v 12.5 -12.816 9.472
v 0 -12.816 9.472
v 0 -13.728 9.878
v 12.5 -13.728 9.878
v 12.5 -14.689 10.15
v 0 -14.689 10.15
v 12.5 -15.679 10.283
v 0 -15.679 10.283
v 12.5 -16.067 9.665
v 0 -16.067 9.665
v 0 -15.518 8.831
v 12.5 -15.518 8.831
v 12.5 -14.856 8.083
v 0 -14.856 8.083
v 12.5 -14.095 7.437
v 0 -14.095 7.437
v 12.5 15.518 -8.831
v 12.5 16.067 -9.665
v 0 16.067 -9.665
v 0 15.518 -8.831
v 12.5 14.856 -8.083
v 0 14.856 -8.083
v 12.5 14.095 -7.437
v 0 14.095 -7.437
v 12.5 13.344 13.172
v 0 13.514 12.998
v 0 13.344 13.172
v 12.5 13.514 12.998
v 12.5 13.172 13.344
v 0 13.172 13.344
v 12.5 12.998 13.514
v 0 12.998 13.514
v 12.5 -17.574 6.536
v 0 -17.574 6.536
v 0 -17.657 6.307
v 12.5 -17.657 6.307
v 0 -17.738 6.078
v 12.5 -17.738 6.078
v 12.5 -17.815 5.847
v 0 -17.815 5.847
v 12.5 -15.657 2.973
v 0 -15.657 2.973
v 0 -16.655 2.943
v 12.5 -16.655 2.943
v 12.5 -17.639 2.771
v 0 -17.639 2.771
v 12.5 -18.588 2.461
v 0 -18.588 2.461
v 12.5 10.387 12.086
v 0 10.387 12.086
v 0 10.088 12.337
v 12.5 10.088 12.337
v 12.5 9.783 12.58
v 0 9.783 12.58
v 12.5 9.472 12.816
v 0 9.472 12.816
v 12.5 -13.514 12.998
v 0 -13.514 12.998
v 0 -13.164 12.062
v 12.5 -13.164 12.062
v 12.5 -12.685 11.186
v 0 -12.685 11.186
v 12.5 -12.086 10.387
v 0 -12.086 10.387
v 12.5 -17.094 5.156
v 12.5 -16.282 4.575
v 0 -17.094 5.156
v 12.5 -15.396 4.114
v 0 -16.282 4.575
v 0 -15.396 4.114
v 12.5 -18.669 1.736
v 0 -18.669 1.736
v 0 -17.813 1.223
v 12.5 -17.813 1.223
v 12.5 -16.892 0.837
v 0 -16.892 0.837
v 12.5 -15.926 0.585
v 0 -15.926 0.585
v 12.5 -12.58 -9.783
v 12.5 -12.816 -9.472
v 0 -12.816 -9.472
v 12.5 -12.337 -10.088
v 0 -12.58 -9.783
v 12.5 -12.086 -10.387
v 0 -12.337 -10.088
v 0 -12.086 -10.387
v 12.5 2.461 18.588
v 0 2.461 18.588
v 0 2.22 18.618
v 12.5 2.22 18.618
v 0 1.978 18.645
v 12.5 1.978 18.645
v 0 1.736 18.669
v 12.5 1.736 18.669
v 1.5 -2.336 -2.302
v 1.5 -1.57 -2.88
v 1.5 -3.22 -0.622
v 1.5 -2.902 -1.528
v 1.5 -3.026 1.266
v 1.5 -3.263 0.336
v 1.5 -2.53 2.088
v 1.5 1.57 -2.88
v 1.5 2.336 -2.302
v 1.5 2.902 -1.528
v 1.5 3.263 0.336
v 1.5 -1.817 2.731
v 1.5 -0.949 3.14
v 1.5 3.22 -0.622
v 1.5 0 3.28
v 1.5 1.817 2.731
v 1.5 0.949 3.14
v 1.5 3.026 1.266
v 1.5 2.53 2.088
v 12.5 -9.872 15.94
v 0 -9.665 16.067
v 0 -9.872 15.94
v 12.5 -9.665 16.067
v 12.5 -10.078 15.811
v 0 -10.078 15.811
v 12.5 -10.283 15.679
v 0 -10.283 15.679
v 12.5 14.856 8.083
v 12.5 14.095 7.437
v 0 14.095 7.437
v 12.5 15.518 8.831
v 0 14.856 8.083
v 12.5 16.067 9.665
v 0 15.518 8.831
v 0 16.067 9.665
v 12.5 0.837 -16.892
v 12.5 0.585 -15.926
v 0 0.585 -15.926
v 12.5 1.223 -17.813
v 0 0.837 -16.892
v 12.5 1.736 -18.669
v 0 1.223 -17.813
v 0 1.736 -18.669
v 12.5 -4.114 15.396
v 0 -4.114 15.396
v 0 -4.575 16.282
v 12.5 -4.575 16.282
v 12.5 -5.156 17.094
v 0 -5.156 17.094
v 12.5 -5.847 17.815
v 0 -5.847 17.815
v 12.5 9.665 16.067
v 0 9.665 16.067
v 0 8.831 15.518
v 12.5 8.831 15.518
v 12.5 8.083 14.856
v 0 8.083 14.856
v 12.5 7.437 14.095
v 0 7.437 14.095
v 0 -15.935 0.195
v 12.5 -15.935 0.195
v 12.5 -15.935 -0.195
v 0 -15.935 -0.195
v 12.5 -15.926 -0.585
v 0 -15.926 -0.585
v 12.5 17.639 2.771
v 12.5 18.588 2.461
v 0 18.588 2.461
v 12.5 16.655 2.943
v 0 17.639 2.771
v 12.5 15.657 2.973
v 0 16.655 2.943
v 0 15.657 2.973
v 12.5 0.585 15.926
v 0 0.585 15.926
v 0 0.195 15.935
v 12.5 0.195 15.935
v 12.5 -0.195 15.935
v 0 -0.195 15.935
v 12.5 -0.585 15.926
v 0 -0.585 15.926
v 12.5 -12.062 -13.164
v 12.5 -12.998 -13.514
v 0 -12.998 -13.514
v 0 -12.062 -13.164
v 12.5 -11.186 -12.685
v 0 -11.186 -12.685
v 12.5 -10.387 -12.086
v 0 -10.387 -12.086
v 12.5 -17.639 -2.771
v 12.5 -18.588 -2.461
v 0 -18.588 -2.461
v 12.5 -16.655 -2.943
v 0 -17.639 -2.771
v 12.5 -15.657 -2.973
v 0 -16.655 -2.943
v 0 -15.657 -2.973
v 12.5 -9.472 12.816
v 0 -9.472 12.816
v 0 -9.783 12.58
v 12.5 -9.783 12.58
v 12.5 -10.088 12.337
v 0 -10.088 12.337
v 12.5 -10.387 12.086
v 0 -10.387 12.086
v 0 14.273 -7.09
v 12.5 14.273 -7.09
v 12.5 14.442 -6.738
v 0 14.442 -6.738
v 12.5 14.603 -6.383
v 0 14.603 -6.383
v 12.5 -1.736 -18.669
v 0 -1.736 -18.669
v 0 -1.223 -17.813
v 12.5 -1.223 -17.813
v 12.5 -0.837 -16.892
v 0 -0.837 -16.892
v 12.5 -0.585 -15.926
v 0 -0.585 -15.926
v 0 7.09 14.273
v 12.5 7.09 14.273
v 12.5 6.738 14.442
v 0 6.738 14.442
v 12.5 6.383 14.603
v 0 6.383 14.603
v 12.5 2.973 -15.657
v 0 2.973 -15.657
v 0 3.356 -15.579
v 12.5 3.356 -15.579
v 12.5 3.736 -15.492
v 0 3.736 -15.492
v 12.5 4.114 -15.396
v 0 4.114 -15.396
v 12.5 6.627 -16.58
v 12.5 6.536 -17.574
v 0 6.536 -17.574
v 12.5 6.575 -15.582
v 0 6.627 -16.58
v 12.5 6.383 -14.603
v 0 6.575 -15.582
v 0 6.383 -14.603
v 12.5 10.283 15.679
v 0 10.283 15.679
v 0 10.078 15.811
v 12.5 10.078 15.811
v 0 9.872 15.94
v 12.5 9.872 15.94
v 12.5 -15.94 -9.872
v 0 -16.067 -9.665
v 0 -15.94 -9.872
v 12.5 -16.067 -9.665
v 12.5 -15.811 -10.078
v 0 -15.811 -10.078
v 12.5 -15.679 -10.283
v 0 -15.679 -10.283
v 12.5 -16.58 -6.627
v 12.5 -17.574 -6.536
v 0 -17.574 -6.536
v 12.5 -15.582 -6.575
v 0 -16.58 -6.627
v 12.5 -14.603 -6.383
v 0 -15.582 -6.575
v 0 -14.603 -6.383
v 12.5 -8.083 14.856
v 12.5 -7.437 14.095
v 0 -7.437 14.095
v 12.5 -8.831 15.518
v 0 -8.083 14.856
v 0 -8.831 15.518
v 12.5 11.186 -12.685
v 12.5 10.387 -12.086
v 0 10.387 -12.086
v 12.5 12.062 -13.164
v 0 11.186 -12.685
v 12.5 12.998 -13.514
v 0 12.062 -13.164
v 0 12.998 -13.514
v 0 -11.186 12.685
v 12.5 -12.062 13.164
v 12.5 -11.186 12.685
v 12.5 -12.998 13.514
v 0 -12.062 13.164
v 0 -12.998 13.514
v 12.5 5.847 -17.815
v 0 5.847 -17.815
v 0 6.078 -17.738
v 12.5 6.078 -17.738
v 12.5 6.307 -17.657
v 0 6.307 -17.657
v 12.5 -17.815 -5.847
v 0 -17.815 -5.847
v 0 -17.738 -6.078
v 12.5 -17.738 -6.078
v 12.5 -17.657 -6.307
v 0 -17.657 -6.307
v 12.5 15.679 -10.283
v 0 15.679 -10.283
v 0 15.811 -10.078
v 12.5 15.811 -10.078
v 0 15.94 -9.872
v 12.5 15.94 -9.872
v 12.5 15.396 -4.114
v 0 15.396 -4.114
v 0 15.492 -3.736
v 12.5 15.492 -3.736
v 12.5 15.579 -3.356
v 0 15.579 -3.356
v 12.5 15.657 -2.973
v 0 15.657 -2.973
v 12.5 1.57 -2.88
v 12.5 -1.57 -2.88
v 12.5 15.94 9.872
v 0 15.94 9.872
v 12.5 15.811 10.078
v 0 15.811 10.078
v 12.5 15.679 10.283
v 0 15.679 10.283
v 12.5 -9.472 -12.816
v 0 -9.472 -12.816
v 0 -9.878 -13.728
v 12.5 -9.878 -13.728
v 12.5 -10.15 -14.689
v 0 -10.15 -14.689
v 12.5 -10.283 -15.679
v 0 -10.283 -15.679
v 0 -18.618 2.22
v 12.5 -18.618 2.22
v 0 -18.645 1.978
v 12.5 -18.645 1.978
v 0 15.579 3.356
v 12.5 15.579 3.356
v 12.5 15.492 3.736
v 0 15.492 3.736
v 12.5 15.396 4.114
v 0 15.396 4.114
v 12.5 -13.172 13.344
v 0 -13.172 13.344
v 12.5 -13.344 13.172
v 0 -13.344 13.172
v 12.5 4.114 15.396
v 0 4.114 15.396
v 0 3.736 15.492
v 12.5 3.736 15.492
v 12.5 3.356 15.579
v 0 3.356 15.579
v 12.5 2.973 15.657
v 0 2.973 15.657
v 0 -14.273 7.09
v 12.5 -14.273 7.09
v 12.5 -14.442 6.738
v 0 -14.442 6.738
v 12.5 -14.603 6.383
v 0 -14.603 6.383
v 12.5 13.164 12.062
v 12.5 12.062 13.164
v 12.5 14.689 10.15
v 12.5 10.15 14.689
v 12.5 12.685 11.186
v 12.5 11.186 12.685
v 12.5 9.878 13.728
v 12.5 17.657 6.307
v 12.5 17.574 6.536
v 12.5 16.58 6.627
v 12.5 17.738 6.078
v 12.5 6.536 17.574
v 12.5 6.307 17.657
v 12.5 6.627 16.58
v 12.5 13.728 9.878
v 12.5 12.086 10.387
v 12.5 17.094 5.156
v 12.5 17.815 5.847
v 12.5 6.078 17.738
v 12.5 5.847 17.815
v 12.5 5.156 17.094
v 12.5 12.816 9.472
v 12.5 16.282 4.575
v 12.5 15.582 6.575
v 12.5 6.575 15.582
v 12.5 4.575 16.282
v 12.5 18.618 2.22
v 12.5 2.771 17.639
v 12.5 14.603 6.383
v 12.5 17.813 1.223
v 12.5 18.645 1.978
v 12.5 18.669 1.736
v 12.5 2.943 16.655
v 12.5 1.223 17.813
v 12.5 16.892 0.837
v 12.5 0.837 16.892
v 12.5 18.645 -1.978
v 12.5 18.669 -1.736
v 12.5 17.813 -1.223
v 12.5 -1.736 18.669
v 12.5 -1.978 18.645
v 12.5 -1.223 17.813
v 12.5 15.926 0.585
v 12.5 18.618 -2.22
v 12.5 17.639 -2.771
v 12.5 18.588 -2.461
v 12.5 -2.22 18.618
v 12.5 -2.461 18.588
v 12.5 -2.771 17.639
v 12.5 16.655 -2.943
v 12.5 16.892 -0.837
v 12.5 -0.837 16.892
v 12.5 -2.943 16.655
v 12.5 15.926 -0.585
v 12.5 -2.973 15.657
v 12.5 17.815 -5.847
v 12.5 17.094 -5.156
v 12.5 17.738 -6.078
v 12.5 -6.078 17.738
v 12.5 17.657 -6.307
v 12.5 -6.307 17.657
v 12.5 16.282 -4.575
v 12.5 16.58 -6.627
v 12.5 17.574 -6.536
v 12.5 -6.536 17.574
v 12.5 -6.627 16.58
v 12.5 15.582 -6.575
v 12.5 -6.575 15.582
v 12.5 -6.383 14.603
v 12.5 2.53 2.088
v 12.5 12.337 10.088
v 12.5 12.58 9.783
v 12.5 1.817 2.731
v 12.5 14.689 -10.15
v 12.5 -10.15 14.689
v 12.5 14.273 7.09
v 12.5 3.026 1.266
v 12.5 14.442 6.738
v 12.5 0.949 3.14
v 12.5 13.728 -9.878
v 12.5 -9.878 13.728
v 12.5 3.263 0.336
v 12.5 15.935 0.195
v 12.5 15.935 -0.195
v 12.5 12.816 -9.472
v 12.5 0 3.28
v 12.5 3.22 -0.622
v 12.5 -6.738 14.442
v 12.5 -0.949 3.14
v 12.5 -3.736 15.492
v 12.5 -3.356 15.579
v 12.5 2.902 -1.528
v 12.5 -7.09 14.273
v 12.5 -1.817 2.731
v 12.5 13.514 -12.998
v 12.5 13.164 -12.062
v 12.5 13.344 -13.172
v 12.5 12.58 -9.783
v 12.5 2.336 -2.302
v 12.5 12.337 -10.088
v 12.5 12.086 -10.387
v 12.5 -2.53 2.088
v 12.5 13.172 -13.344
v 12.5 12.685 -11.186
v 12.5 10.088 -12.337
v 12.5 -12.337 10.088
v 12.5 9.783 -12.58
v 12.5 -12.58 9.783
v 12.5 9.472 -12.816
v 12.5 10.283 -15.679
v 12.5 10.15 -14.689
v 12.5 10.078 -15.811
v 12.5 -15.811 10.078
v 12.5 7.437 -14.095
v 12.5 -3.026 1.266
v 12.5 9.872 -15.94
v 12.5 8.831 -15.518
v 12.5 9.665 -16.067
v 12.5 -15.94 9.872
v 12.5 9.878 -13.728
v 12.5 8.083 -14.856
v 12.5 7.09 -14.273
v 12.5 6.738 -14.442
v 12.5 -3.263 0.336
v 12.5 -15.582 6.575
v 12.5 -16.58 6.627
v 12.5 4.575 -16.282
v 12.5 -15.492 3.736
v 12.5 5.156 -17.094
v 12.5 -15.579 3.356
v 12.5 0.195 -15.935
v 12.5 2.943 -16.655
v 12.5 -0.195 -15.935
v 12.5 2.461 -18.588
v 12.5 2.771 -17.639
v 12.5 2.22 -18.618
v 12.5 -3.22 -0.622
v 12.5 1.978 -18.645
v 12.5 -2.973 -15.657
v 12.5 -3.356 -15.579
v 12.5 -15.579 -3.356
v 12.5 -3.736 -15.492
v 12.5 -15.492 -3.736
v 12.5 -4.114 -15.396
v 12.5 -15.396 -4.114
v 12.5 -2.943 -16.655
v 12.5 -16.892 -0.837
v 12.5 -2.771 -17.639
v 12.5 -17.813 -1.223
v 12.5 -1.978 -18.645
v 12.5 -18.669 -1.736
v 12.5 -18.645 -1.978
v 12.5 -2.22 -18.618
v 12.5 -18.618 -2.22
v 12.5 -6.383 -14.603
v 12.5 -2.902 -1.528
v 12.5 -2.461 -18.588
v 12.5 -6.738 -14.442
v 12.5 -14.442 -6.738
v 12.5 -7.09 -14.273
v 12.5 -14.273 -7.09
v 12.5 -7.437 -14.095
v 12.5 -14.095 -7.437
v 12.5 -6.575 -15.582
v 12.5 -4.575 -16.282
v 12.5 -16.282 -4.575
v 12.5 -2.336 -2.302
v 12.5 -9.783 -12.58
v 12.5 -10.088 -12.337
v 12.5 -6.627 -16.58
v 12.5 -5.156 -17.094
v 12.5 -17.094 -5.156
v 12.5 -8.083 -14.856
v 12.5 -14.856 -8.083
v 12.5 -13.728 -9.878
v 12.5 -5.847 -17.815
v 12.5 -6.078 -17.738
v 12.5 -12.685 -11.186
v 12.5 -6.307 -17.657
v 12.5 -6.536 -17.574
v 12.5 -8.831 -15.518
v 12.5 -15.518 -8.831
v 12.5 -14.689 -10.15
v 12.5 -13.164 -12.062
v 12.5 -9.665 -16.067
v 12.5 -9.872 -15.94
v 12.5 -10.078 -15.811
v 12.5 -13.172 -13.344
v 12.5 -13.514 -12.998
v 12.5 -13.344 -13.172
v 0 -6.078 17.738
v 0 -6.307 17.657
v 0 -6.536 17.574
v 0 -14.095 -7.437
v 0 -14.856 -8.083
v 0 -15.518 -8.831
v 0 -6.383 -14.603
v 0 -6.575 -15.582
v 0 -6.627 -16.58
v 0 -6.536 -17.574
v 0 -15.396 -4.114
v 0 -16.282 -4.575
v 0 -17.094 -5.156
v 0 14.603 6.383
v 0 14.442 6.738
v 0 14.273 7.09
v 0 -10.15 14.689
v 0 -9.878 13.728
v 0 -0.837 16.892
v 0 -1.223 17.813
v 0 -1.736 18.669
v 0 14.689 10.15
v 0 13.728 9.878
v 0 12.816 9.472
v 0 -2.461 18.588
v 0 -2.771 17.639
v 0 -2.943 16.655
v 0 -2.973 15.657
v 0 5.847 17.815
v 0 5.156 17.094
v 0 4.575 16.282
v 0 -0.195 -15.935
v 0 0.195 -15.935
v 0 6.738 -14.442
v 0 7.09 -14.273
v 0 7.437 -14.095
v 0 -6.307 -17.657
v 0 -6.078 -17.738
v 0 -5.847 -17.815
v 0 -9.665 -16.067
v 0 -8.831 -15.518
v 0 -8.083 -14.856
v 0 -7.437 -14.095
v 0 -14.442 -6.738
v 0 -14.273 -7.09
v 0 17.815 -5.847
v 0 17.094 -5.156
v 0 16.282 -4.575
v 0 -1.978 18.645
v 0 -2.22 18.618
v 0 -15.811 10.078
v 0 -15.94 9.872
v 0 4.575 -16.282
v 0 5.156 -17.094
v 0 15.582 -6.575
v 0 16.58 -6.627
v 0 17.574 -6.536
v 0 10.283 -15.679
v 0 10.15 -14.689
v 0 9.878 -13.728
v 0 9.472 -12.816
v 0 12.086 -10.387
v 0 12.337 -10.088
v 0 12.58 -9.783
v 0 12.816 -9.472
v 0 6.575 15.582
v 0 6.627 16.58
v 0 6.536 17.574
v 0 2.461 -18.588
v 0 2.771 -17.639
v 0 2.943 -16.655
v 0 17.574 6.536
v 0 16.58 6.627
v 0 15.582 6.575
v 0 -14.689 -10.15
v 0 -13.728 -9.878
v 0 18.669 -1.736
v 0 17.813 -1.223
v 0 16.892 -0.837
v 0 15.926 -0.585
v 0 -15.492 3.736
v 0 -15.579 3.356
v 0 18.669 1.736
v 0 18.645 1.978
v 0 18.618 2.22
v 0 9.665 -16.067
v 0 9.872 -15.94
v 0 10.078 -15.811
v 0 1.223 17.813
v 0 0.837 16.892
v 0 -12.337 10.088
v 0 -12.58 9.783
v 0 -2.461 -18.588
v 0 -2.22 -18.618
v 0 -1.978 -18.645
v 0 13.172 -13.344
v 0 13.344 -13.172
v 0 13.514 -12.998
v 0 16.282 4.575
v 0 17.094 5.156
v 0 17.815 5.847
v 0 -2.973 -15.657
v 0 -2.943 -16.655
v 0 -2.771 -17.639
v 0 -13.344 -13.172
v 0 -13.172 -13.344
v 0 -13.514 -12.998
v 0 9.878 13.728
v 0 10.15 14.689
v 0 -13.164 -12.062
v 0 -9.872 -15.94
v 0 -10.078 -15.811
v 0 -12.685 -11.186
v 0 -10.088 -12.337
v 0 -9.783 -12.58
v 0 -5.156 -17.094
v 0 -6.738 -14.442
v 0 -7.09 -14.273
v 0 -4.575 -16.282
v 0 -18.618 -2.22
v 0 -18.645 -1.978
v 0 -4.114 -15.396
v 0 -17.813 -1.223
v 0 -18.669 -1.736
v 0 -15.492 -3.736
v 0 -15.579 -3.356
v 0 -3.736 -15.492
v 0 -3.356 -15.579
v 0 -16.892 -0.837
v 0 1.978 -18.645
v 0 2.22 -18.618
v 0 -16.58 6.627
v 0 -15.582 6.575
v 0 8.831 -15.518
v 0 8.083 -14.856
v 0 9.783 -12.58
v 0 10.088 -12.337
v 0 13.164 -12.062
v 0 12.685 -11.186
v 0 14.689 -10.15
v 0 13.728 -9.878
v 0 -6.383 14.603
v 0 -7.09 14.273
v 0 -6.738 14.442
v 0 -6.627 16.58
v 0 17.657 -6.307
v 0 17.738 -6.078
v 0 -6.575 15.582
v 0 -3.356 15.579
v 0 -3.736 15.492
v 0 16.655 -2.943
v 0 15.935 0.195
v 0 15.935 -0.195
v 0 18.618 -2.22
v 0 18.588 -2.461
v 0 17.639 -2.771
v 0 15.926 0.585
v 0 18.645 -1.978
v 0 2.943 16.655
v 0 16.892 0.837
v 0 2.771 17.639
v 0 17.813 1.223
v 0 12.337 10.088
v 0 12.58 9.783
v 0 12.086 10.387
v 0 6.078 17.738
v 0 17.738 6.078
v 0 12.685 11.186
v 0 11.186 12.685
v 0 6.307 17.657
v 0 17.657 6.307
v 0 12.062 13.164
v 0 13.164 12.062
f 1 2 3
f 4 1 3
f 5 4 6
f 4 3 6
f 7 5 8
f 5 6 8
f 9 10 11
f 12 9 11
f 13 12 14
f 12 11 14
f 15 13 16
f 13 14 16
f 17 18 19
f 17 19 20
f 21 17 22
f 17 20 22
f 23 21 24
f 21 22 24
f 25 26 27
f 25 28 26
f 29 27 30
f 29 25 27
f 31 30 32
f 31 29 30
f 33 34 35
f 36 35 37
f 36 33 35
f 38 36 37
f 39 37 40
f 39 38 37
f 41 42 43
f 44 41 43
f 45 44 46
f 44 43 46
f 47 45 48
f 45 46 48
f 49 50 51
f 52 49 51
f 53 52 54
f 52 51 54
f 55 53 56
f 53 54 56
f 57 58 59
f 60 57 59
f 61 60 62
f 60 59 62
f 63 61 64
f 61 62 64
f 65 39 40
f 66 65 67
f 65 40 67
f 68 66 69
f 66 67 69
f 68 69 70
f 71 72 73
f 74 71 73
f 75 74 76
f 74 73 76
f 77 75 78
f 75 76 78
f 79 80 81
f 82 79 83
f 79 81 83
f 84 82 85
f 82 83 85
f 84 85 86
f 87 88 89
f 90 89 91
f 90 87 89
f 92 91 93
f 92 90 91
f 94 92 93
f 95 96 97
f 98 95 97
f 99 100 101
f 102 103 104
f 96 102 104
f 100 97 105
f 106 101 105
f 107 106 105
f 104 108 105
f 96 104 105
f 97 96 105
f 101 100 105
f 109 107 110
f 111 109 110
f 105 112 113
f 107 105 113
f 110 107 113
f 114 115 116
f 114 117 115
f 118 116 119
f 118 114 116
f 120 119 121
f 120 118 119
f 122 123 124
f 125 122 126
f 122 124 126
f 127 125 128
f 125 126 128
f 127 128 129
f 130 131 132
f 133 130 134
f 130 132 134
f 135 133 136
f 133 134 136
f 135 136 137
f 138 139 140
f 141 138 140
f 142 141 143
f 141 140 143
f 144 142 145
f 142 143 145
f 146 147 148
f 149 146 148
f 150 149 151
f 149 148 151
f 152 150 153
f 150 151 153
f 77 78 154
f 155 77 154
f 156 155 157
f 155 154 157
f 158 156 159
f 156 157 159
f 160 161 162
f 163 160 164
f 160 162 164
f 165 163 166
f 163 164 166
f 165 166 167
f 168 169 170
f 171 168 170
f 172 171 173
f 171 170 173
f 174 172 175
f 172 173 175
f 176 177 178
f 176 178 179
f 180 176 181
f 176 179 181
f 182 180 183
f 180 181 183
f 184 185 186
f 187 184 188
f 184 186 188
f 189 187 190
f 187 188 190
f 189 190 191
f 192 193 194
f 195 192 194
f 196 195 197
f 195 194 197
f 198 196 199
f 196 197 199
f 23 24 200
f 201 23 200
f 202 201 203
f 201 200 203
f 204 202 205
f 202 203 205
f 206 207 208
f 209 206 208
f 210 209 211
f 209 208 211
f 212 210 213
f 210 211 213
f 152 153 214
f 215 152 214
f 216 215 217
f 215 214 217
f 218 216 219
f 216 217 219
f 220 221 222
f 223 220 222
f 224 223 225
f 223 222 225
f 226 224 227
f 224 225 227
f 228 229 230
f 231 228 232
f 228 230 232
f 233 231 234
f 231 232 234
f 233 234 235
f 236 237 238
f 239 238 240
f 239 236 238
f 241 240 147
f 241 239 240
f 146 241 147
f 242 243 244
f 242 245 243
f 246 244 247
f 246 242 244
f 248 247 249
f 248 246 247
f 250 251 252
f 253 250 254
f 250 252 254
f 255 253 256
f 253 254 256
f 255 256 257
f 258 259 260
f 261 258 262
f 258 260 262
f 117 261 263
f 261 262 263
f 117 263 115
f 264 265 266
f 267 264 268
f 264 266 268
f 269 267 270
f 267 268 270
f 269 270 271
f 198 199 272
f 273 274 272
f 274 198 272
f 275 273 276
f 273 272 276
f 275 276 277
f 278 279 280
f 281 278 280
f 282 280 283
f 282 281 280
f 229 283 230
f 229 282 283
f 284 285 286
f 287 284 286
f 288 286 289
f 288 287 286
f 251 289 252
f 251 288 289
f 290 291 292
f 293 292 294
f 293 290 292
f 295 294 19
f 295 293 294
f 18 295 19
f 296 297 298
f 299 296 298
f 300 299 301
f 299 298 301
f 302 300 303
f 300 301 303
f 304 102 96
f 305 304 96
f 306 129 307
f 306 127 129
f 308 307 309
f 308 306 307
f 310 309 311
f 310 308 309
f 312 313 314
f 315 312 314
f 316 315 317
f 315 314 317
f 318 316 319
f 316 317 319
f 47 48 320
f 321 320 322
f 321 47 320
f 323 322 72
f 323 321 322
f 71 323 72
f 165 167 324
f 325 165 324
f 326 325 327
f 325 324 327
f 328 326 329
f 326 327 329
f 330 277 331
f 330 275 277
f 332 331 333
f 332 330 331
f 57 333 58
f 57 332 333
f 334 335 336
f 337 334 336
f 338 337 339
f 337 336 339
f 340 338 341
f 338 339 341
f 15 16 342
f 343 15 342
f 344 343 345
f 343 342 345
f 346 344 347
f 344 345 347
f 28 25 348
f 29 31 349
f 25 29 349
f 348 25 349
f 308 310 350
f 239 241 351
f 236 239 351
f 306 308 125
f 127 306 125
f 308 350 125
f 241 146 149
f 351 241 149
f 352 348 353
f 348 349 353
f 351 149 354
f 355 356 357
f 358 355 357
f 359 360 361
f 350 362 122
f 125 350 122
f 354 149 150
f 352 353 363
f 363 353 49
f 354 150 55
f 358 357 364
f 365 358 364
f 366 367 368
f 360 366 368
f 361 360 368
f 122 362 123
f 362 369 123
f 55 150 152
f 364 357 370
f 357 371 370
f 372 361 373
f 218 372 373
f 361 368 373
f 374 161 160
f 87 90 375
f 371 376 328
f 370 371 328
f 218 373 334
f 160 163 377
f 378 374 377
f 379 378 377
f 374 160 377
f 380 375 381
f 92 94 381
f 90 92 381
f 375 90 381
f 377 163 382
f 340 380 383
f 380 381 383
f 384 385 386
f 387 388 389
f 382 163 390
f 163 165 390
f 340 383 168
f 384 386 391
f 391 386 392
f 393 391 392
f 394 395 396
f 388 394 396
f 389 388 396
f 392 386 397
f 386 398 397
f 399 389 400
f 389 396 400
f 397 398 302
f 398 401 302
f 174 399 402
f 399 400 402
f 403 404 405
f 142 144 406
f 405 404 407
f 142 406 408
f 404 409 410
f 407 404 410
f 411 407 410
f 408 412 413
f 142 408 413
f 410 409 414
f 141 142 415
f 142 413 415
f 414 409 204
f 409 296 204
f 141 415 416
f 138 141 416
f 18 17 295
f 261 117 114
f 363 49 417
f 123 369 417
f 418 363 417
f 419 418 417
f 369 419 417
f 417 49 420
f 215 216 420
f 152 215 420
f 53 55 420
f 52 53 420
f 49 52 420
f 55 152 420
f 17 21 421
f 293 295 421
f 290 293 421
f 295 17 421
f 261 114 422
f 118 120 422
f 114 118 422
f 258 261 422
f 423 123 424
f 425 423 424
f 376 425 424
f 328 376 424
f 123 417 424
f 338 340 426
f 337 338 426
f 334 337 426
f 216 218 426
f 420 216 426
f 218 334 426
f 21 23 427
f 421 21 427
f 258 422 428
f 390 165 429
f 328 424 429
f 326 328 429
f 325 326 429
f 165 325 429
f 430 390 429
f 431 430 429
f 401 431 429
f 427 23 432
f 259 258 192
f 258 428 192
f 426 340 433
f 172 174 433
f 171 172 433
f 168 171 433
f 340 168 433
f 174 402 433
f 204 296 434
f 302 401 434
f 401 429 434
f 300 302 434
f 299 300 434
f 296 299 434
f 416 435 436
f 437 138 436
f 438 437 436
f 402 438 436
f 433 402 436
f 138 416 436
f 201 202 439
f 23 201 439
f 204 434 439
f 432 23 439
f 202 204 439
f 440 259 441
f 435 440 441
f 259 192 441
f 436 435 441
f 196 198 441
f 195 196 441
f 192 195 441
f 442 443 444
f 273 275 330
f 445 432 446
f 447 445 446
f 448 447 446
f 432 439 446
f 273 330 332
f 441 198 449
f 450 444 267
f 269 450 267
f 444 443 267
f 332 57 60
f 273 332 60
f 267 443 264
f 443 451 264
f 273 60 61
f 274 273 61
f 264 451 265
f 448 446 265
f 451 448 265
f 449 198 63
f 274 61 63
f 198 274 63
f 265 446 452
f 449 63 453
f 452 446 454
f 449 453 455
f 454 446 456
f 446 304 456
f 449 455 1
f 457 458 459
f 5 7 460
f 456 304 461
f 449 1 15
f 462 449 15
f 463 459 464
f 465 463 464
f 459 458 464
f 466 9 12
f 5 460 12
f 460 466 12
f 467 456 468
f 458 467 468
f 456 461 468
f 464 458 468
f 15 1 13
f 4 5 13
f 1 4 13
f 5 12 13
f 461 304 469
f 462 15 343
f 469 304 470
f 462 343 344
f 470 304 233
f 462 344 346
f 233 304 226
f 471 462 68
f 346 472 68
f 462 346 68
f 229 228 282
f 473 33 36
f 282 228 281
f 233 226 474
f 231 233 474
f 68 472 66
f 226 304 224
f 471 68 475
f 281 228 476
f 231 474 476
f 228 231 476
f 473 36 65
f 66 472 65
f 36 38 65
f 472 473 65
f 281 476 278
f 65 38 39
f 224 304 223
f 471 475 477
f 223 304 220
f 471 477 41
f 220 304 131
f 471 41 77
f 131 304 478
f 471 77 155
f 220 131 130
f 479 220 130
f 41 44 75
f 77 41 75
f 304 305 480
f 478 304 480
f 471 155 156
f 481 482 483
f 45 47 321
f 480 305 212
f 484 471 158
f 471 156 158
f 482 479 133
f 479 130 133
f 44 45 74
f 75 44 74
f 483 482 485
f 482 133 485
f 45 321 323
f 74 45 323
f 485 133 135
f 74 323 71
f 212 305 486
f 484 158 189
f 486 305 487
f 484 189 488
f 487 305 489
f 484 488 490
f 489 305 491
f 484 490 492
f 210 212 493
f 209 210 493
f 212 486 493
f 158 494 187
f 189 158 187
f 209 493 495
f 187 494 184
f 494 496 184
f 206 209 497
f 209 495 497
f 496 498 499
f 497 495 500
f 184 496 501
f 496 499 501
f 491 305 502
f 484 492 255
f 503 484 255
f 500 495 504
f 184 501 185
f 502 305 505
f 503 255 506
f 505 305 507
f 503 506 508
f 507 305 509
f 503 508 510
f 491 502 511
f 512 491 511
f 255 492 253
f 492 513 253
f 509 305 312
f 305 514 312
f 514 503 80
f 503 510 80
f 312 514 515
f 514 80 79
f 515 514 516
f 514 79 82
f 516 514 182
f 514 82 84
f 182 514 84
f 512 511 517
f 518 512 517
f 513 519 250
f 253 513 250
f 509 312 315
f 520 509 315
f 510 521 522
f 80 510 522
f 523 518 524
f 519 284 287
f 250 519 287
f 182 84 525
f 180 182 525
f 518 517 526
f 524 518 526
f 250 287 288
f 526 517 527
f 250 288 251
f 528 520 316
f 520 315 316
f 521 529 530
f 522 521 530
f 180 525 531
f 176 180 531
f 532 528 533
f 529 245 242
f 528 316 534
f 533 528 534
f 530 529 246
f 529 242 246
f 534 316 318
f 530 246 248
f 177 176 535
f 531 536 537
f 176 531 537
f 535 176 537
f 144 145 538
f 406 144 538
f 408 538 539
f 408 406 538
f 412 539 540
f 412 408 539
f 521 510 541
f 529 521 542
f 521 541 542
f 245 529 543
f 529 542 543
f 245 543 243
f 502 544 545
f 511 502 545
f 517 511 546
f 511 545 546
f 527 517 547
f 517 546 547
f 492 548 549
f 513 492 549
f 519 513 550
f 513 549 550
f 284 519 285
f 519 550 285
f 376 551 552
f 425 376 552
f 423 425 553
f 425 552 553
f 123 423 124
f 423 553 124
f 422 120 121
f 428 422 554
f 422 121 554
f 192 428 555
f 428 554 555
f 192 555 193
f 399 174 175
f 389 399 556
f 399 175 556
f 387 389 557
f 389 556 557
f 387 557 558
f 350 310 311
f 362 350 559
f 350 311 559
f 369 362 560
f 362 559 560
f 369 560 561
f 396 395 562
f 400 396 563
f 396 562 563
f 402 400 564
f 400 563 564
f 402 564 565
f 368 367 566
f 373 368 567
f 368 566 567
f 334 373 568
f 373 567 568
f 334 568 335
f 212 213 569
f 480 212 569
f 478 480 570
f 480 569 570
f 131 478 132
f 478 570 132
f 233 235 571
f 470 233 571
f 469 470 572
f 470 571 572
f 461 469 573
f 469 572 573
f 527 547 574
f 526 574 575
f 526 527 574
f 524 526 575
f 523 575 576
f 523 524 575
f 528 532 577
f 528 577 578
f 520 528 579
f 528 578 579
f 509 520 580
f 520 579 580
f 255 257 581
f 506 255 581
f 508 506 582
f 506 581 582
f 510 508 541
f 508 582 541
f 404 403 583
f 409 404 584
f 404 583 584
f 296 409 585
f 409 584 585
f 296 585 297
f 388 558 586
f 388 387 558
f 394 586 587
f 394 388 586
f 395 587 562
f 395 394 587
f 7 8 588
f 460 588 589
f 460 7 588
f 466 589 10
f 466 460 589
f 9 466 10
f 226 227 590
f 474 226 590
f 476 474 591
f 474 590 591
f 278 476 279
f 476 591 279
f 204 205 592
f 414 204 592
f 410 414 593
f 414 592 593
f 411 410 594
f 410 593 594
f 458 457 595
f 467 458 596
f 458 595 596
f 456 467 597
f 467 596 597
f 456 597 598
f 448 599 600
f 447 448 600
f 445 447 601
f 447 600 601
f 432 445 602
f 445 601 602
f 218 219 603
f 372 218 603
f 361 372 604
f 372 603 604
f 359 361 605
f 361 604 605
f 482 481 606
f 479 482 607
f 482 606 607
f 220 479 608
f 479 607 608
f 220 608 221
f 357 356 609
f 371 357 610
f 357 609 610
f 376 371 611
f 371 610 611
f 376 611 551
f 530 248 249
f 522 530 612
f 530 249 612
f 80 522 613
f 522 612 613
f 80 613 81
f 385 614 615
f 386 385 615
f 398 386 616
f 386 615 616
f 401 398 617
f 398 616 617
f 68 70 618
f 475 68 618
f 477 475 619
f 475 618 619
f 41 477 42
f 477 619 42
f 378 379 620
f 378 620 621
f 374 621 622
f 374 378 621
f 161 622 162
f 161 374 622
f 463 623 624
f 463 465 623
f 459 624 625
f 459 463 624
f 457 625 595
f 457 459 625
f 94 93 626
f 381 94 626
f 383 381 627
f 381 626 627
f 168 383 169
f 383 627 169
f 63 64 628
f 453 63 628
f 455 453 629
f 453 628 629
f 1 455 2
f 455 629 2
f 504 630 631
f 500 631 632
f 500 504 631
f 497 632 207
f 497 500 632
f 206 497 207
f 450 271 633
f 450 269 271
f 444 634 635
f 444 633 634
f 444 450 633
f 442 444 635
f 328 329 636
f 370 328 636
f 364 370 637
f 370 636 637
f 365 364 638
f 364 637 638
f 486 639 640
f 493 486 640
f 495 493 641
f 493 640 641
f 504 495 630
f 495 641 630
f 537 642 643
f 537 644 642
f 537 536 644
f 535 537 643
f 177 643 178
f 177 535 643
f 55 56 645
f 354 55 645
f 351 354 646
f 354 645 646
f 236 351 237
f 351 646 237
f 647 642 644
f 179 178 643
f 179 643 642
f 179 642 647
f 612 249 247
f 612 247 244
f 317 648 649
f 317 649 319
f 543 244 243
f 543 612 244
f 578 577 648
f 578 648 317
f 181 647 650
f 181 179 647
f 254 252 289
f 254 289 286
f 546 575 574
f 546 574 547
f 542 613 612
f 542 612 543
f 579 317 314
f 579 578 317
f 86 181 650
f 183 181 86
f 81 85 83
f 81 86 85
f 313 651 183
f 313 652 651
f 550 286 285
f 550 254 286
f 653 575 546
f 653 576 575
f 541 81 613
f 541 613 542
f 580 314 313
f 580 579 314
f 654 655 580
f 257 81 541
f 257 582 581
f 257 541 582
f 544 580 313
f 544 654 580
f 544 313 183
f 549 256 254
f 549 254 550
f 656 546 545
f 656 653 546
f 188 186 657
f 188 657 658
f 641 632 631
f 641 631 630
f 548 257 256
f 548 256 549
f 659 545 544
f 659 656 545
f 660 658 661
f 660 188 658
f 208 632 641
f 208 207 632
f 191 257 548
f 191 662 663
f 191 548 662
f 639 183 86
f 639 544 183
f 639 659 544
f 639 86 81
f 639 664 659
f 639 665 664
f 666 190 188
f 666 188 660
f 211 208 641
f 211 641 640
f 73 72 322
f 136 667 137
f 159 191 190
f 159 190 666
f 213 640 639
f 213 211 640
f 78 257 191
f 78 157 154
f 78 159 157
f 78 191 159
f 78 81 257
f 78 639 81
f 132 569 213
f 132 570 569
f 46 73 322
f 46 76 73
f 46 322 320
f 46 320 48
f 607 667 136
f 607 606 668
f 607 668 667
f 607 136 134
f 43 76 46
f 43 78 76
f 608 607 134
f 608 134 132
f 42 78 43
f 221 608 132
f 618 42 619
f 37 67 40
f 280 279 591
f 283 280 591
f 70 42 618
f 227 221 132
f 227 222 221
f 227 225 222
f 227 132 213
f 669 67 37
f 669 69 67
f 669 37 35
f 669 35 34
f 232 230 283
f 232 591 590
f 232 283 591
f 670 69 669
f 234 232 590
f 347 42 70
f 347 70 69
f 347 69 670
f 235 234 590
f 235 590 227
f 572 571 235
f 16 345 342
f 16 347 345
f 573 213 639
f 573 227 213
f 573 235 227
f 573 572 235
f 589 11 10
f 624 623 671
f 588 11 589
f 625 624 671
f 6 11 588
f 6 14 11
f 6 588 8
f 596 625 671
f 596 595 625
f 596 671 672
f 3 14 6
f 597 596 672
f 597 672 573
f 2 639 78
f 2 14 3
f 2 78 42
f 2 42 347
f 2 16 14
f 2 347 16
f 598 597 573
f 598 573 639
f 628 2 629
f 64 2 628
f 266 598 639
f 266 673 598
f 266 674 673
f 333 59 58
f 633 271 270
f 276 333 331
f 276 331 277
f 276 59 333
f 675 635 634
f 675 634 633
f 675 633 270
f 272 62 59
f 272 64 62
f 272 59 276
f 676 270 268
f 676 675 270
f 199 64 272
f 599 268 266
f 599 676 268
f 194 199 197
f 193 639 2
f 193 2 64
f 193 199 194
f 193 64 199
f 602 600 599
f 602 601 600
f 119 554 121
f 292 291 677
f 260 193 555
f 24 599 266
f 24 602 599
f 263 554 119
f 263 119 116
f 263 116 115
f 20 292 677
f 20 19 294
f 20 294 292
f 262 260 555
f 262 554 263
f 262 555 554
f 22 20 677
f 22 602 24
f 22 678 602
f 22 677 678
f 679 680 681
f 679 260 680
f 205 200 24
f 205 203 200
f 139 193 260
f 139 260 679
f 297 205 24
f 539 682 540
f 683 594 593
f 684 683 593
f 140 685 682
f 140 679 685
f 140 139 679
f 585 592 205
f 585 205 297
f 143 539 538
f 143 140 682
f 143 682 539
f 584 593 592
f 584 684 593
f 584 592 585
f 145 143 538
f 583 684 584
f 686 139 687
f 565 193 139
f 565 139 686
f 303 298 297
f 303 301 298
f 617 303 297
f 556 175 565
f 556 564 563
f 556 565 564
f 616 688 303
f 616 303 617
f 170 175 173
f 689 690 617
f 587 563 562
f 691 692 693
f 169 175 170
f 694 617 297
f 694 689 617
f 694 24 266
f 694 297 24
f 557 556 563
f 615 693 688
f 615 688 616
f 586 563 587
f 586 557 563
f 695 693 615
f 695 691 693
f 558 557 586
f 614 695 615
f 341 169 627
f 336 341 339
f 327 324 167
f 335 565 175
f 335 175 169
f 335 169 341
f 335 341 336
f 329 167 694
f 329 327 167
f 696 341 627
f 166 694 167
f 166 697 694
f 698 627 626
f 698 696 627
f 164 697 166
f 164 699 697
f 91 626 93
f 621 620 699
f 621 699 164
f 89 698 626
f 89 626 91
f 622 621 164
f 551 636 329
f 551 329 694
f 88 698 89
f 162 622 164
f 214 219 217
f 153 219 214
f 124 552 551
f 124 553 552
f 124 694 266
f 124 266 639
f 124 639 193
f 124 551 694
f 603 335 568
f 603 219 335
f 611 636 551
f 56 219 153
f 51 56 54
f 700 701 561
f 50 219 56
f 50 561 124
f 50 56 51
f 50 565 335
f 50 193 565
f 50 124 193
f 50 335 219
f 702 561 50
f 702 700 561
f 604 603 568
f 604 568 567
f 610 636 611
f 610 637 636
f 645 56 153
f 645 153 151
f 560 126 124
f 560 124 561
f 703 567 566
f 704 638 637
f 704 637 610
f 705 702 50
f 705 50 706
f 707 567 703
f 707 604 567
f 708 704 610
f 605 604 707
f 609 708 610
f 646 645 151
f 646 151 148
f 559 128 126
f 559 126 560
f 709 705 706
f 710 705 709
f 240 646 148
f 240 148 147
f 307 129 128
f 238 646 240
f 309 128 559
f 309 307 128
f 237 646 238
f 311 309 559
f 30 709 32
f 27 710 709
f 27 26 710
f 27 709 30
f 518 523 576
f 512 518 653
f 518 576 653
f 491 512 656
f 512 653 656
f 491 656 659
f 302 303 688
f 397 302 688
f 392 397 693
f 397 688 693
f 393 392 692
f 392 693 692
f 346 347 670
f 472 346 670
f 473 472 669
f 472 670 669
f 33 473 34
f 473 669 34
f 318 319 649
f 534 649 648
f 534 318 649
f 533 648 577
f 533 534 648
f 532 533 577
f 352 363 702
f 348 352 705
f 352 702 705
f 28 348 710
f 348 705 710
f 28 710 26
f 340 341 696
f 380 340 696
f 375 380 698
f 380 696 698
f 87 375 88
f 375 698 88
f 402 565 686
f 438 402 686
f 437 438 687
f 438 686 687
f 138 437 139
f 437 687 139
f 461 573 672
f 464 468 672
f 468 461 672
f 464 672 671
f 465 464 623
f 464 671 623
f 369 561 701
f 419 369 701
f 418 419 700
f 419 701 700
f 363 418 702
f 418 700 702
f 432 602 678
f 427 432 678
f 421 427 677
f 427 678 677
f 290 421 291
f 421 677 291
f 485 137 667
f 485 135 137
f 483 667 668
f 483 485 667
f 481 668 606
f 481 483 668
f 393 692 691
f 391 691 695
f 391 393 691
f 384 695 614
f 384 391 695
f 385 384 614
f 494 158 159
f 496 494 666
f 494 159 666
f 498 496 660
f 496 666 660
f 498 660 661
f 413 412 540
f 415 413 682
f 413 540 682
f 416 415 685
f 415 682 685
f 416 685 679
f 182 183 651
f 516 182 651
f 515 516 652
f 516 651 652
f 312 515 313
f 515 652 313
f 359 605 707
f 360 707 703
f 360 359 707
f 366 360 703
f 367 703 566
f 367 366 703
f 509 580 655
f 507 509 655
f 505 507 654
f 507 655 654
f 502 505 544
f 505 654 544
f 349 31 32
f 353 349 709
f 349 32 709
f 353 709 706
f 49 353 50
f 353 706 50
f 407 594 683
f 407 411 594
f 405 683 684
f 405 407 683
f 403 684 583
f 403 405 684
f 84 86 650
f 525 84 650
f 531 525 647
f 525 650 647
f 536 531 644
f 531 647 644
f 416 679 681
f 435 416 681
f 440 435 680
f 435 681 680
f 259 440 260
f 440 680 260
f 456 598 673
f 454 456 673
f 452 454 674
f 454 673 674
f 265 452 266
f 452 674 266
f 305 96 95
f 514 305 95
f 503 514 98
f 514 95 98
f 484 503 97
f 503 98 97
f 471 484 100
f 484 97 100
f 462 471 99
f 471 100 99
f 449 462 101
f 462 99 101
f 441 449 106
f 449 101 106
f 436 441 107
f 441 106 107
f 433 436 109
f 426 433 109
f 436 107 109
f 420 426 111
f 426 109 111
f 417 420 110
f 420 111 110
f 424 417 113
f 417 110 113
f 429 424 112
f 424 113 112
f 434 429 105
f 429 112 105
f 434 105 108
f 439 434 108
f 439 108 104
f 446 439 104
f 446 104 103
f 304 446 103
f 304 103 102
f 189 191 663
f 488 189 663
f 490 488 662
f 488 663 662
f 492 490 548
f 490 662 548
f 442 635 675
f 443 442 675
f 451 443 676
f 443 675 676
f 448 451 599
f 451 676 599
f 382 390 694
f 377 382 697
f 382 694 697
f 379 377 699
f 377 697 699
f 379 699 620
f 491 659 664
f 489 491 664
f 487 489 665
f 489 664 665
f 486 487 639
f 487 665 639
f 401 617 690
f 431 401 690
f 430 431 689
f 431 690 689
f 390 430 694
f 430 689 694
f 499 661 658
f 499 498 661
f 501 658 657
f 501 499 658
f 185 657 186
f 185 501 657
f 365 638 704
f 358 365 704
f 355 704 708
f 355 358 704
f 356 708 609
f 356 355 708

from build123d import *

# Parameters (mm, degrees)
BASPROSKE_W         = 12.5
BASPROSKE_H         = 18.75
TOOTHCUT_DEPTH      = 30.315098499
TEETHCUTS_COUNT     = 28
TEETHCUTS_ANGLE     = 347.142857143
BORSKE_R            = 1
BORE_DEPTH          = 50.0000508
CUT_EXTRUDE1_DEPTH  = 30.212056464
SKETCH2_R           = 3.28
BOSS_EXTRUDE1_DEPTH = 1.5


with BuildPart() as part:
    # BasProSke → Base-Revolve (revolve)
    with BuildSketch(Plane(origin=(0, 0, 0), x_dir=(1, 0, 0), z_dir=(0, 1, 0)), mode=Mode.PRIVATE) as base_revolve_sk:
        with Locations((6.25, 9.375)):
            Rectangle(BASPROSKE_W, BASPROSKE_H)
    revolve(base_revolve_sk.sketch.rotate(Axis((-10, 0, 0), (1, 0, 0)), 180), axis=Axis((-10, 0, 0), (1, 0, 0)))

    # TooCutSke → ToothCut (cut, through all)
    with BuildSketch(Plane(origin=(0, 0, 0), x_dir=(0, 0, -1), z_dir=(1, 0, 0))):
        with BuildLine():
            ThreePointArc((0.585229427, 15.925750807), (0, 15.9365), (-0.585229427, 15.925750807))
            ThreePointArc((-0.585229427, 15.925750807), (-1.019072842, 17.372951322), (-1.753340618, 18.693352878))
            ThreePointArc((-1.753340618, 18.693352878), (0, 18.7754), (1.753340618, 18.693352878))
            ThreePointArc((1.753340618, 18.693352878), (1.019072842, 17.372951322), (0.585229427, 15.925750807))
        make_face()
    toothcut = extrude(amount=TOOTHCUT_DEPTH, mode=Mode.SUBTRACT)

    # TeethCuts: ToothCut ×28 about axis
    teethcuts_axis = Axis((-10, 0, 0), (1, 0, 0))
    for i in range(1, TEETHCUTS_COUNT):
        add(toothcut.rotate(teethcuts_axis, i * TEETHCUTS_ANGLE / (TEETHCUTS_COUNT - 1)), mode=Mode.SUBTRACT)

    # BorSke → Bore (cut, symmetric)
    with BuildSketch(Plane(origin=(0, 0, 0), x_dir=(0, 0, -1), z_dir=(1, 0, 0))):
        with Locations(Location((0, 0, 0), (0, 0, 180))):
            Circle(BORSKE_R)
    extrude(amount=BORE_DEPTH, both=True, mode=Mode.SUBTRACT)

    # Sketch1 → Cut-Extrude1 (cut, through all)
    with BuildSketch(Plane.ZY):
        with BuildLine():
            Line((-2.88, 1.56971335), (-2.88, -1.56971335))
            ThreePointArc((-2.88, -1.56971335), (3.28, 0), (-2.88, 1.56971335))
        make_face()
    extrude(amount=-CUT_EXTRUDE1_DEPTH, mode=Mode.SUBTRACT)

    # Sketch2 → Boss-Extrude1 (add)
    with BuildSketch(Plane.ZY):
        Circle(SKETCH2_R)
    extrude(amount=-BOSS_EXTRUDE1_DEPTH)


solid = part.part
